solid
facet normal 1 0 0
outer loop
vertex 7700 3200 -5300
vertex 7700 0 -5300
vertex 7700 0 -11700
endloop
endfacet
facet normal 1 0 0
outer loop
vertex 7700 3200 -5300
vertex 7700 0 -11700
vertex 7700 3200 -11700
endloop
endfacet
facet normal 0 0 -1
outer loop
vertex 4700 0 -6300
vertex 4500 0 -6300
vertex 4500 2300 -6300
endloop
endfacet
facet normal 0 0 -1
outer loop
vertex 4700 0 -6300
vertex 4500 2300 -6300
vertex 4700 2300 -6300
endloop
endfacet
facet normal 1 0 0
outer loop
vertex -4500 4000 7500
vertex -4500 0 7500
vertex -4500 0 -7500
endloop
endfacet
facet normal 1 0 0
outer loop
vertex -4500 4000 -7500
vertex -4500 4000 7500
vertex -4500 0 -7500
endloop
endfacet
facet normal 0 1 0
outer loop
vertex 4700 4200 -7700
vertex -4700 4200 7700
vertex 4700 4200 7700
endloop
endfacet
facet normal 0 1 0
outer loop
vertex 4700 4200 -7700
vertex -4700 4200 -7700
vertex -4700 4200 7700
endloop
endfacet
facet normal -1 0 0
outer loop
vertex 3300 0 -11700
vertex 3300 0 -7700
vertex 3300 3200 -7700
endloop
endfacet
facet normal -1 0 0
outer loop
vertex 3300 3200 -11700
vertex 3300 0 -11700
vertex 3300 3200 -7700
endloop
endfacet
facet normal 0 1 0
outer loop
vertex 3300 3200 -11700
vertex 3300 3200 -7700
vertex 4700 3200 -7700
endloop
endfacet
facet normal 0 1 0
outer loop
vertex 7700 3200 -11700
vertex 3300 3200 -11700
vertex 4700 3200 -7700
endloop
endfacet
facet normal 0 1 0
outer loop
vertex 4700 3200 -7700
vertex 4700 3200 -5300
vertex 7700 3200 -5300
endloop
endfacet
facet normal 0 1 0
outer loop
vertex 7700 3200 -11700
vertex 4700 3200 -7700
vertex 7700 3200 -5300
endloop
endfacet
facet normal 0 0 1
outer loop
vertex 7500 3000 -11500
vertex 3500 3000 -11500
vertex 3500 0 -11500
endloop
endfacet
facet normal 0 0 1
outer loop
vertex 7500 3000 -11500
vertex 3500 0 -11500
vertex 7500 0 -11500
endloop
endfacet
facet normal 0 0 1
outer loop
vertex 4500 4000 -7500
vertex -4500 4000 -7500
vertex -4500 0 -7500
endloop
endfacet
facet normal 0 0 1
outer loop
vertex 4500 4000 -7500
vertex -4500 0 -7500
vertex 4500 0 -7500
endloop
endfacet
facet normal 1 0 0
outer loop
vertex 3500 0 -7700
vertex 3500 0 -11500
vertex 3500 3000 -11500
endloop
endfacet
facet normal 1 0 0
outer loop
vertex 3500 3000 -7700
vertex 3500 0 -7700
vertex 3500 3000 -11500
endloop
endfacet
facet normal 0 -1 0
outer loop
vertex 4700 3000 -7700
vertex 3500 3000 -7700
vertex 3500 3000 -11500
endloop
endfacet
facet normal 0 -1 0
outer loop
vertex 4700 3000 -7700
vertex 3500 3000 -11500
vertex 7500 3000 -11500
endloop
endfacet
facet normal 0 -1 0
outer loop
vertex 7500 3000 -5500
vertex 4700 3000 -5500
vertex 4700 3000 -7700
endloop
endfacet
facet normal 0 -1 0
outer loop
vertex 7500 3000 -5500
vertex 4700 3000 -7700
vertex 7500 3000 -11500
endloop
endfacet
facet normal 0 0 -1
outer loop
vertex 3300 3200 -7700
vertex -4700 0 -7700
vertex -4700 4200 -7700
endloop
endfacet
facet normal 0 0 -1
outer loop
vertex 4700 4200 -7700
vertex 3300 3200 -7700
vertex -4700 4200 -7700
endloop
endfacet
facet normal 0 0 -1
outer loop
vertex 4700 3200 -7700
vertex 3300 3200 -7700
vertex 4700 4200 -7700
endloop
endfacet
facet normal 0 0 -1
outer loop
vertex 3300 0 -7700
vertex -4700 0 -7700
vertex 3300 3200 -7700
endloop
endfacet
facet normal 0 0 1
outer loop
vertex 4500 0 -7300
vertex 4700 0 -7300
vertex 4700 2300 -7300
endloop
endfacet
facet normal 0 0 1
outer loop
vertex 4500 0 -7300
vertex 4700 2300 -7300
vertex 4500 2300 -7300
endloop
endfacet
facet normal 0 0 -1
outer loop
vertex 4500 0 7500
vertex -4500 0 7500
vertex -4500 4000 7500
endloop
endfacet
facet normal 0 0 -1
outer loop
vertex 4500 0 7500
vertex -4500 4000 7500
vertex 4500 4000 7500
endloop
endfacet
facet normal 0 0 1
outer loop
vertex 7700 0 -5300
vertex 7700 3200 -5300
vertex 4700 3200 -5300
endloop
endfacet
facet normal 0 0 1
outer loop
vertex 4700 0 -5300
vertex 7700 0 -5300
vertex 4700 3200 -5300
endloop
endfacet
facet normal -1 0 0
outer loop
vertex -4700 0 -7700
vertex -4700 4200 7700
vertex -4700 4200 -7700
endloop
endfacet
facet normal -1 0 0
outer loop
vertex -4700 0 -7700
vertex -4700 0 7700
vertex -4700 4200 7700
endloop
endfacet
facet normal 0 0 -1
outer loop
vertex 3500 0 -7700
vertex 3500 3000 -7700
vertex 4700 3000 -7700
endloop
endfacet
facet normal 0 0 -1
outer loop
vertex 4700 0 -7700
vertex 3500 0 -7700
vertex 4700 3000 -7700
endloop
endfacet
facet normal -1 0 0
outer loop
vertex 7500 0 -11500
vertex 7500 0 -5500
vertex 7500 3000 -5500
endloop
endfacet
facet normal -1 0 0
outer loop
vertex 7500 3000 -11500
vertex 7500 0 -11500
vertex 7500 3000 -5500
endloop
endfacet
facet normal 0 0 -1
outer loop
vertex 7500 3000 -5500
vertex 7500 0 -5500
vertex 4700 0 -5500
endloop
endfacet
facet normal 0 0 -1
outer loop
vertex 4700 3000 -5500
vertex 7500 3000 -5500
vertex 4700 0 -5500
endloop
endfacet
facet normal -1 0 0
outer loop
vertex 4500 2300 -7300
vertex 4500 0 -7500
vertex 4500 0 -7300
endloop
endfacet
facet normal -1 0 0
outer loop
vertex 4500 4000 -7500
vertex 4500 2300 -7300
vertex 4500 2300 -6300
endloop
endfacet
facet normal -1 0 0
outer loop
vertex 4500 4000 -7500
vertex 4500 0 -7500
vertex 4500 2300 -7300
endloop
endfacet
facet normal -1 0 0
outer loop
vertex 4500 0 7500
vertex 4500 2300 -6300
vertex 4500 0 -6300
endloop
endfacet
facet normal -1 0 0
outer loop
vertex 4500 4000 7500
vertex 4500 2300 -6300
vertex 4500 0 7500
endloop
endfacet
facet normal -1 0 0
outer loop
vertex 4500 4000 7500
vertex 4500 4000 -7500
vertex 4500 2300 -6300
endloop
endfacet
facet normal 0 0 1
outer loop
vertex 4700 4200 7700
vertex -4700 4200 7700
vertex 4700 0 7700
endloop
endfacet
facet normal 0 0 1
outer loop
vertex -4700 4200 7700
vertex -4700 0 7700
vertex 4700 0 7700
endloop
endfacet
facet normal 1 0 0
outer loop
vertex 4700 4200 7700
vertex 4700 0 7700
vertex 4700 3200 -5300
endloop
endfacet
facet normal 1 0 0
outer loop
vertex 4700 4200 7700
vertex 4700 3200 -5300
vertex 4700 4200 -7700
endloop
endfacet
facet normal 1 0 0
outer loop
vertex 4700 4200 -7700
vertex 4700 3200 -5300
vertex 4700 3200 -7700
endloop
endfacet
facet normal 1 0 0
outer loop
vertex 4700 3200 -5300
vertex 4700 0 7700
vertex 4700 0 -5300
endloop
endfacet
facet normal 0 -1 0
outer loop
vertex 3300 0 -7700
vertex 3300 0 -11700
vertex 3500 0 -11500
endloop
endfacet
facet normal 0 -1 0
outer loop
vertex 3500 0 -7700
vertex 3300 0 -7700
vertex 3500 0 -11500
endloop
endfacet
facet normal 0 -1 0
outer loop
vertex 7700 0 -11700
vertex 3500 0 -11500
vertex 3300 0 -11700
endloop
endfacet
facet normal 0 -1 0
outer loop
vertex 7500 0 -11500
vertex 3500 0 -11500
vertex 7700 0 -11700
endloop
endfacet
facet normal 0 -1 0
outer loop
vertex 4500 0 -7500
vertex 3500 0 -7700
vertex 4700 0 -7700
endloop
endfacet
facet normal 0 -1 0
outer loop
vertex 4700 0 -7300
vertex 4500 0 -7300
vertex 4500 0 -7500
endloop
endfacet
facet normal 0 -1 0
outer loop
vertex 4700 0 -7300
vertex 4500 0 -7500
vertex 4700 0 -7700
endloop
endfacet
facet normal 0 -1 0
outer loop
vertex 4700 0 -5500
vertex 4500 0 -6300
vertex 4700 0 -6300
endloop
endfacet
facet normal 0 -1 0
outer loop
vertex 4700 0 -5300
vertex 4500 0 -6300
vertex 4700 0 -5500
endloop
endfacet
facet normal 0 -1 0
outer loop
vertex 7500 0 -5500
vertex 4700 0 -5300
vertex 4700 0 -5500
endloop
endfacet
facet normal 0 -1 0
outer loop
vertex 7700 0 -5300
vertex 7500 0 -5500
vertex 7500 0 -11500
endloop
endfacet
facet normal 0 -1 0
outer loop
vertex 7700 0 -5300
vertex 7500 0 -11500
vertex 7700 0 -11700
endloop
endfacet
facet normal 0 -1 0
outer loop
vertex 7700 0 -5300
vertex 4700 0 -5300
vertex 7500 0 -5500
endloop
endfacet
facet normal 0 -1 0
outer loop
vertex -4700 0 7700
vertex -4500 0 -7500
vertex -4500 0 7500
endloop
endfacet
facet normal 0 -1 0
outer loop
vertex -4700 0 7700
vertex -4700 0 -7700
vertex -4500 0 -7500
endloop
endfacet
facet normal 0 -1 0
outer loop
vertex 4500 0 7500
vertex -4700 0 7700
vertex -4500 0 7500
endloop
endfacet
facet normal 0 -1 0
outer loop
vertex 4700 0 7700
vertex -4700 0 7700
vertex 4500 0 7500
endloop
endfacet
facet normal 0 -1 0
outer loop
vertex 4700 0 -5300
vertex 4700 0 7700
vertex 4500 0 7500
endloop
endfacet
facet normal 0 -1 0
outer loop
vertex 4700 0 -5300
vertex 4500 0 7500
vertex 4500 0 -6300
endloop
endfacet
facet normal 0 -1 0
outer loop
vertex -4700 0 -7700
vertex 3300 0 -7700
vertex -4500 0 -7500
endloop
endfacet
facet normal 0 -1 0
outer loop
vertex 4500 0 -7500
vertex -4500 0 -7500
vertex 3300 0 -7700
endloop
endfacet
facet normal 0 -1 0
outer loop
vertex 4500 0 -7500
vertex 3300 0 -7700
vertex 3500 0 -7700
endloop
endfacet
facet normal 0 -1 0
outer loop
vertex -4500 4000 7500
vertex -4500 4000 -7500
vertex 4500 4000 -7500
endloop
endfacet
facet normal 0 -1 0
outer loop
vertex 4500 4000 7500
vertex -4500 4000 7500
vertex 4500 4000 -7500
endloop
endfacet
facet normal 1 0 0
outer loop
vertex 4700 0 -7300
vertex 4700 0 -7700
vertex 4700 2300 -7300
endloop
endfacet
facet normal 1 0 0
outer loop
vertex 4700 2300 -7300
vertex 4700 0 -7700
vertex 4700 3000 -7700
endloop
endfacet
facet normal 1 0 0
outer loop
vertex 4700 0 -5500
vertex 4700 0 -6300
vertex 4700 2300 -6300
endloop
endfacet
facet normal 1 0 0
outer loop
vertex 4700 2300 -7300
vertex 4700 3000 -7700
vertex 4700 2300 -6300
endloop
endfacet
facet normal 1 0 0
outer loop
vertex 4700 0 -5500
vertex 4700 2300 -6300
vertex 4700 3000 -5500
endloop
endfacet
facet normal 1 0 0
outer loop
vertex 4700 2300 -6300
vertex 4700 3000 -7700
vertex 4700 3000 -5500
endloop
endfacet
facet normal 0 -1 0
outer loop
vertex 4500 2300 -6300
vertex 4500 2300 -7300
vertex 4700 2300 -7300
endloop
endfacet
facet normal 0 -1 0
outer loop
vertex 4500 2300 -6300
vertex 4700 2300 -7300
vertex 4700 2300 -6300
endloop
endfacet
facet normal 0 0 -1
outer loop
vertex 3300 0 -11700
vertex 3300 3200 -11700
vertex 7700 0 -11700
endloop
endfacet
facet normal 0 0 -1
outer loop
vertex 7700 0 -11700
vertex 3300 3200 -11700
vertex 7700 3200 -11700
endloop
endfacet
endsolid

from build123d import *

# Parameters (mm, degrees)
SKETCH1_W                        = 9000
SKETCH1_H                        = 15000
BOSS_EXTRUDE1_DEPTH              = 4000
BOSS_EXTRUDE2_DEPTH              = 4000
BOSS_EXTRUDE2_DEPTH_BACK         = 2000
SKETCH2_W                        = 3000
SKETCH2_H                        = 3000
SKETCH2_W_2                      = 1000
SKETCH3_W                        = 11000
SKETCH3_H                        = 7000
BOSS_EXTRUDE3_DEPTH              = 12500
SKETCH4_W                        = 7000
SKETCH4_H                        = 4000
BOSS_EXTRUDE4_DEPTH              = 1500
SKETCH5_W                        = 10000
SKETCH5_H                        = 4000
BOSS_EXTRUDE5_DEPTH              = 12000
SKETCH6_R                        = 2000
BOSS_EXTRUDE6_DEPTH              = 6000
BOSS_EXTRUDE8_DEPTH              = 10000
BOSS_EXTRUDE8_DEPTH_BACK         = 4000
SKETCH9_R                        = 7500
REVOLVE5_ANGLE                   = 180
BOSS_EXTRUDE9_START              = 40000
BOSS_EXTRUDE9_DEPTH              = 40000
BOSS_EXTRUDE11_REACH             = 44869.165
SKETCH16_R                       = 7500
BOSS_EXTRUDE11_DIRECTION_2_DEPTH = 20000
BOSS_EXTRUDE12_DEPTH             = 10000
FILLET1_R                        = 1000
FILLET2_R                        = 1000
SKETCH19_W                       = 3000
SKETCH19_H                       = 6000
CUT_EXTRUDE1_DEPTH               = 8500
CUT_EXTRUDE2_DEPTH               = 65678.168408597
CUT_EXTRUDE2_DEPTH_BACK          = 65678.168408597
CUT_EXTRUDE5_START               = -6000
CUT_EXTRUDE5_DEPTH               = 24250
SHELL1_T                         = 200
SKETCH23_W                       = 1000
SKETCH23_H                       = 200
SKETCH23_W_2                     = 200
SKETCH23_H_2                     = 800
BOSS_EXTRUDE13_DEPTH             = 3000
SKETCH24_W                       = 1000
SKETCH24_H                       = 700
BOSS_EXTRUDE14_DEPTH             = 200


# Read off the part's stored shape, not the designer's step: Cut-Extrude5
with BuildPart() as part:
    # Sketch1 → Boss-Extrude1 (new body)
    with BuildSketch(Plane(origin=(0, 0, 0), x_dir=(1, 0, 0), z_dir=(0, 1, 0))):
        Rectangle(SKETCH1_W, SKETCH1_H)
    extrude(amount=BOSS_EXTRUDE1_DEPTH)

    # Sketch2 → Boss-Extrude2 (add, two sides: drawn at the far end of the back side and taken through both)
    with BuildSketch(Plane(origin=(0, 0, -7500), x_dir=(-1, 0, 0), z_dir=(0, 0, -1)).offset(-BOSS_EXTRUDE2_DEPTH_BACK)):
        with Locations((-6000, 1500)):
            Rectangle(SKETCH2_W, SKETCH2_H)
        with Locations((-4000, 1500)):
            Rectangle(SKETCH2_W_2, SKETCH2_H)
    extrude(amount=BOSS_EXTRUDE2_DEPTH + BOSS_EXTRUDE2_DEPTH_BACK)

    # Sketch3 → Boss-Extrude3 (add)
    with BuildSketch(Plane.XZ):
        with Locations((5000, -8000)):
            Rectangle(SKETCH3_W, SKETCH3_H)
    extrude(amount=BOSS_EXTRUDE3_DEPTH)

    # Sketch4 → Boss-Extrude4 (add)
    with BuildSketch(Plane.XZ.offset(12500)):
        with Locations((7000, -9500)):
            Rectangle(SKETCH4_W, SKETCH4_H)
    extrude(amount=BOSS_EXTRUDE4_DEPTH)

    # Sketch5 → Boss-Extrude5 (add)
    with BuildSketch(Plane.XY.offset(-4500)):
        with Locations((4500, -10500)):
            Rectangle(SKETCH5_W, SKETCH5_H)
    extrude(amount=BOSS_EXTRUDE5_DEPTH)

    # Sketch6 → Boss-Extrude6 (add)
    with BuildSketch(Plane(origin=(9500, 0, 0), x_dir=(0, 0, -1), z_dir=(1, 0, 0))):
        with Locations(Location((-5250, -11500, 0), (0, 0, 210))):
            Circle(SKETCH6_R)
    extrude(amount=BOSS_EXTRUDE6_DEPTH)

    # Sketch9 → Boss-Extrude8 (add, two sides: drawn at the far end of the back side and taken through both)
    with BuildSketch(Plane(origin=(0, -10500, 0), x_dir=(-1, 0, 0), z_dir=(0, -1, 0)).offset(-BOSS_EXTRUDE8_DEPTH_BACK)):
        with Locations(Location((-22728.4161474, -5250, 0), (0, 0, 90))):
            Circle(SKETCH9_R)
    extrude(amount=BOSS_EXTRUDE8_DEPTH + BOSS_EXTRUDE8_DEPTH_BACK)

    # Sketch10 → Revolve5 (revolve)
    with BuildSketch(Plane(origin=(0, -6500, 0), x_dir=(1, 0, 0), z_dir=(0, 1, 0))):
        with BuildLine():
            Line((15228.4161474, -5250), (30228.4161474, -5250))
            ThreePointArc((30228.4161474, -5250), (22728.4161474, 2250), (15228.4161474, -5250))
        make_face()
    revolve(axis=Axis((15228.4161474, -6500, 5250), (1, 0, 0)), revolution_arc=REVOLVE5_ANGLE)

    # Sketch12 → Boss-Extrude9 (add)
    with BuildSketch(Plane.ZY.offset(500).offset(BOSS_EXTRUDE9_START)):
        with BuildLine():
            ThreePointArc((3517.949192431, -12500), (5250, -13500), (6982.050807569, -12500))
            ThreePointArc((6982.050807569, -12500), (5250, -9500), (3517.949192431, -12500))
        make_face()
    extrude(amount=-BOSS_EXTRUDE9_DEPTH)

    # Boss-Extrude11: up to this face of the body (flat: up to its plane)
    boss_extrude11_end = Plane(part.part.faces().sort_by_distance((-250, 0, 750))[0])
    # Sketch16 → Boss-Extrude11 (add, up to the picked face)
    with BuildSketch(Plane(origin=(0, -10500, 0), x_dir=(-1, 0, 0), z_dir=(0, -1, 0)), mode=Mode.PRIVATE) as boss_extrude11_sk1:
        with Locations(Location((47728.4161474, -5250, 0), (0, 0, 90))):
            Circle(SKETCH16_R)
    boss_extrude11_tool1 = split(extrude(boss_extrude11_sk1.sketch, amount=-BOSS_EXTRUDE11_REACH, mode=Mode.PRIVATE), bisect_by=boss_extrude11_end, keep=Keep.BOTH, mode=Mode.PRIVATE)
    add(boss_extrude11_tool1.solids().sort_by(Axis((-47728.416147, -10500, 5250), (0, 1, 0)))[0])

    # Sketch16 → Boss-Extrude11 direction 2 (add)
    with BuildSketch(Plane(origin=(0, -10500, 0), x_dir=(-1, 0, 0), z_dir=(0, -1, 0))):
        with Locations(Location((47728.4161474, -5250, 0), (0, 0, 90))):
            Circle(SKETCH16_R)
    extrude(amount=BOSS_EXTRUDE11_DIRECTION_2_DEPTH)

    # Sketch18 → Boss-Extrude12 (add)
    with BuildSketch(Plane(origin=(-500, 0, 0), x_dir=(0, 0, -1), z_dir=(1, 0, 0))):
        with BuildLine():
            Line((-3517.949192431, -12500), (-6982.050807569, -12500))
            ThreePointArc((-6982.050807569, -12500), (-5250, -13500), (-3517.949192431, -12500))
        make_face()
    extrude(amount=BOSS_EXTRUDE12_DEPTH)

    # Fillet1
    fillet1_edges = [part.edges().sort_by_distance(p)[0] for p in [
        (22728.4161474, -20500, 12750),
    ]]
    fillet(fillet1_edges, radius=FILLET1_R)

    # Fillet2
    fillet2_edges = [part.edges().sort_by_distance(p)[0] for p in [
        (-47728.4161474, -30500, 12750),
    ]]
    fillet(fillet2_edges, radius=FILLET2_R)

    # Sketch19 → Cut-Extrude1 (cut)
    with BuildSketch(Plane(origin=(0, 0, 0), x_dir=(1, 0, 0), z_dir=(0, 1, 0))):
        with Locations((9000, 8500)):
            Rectangle(SKETCH19_W, SKETCH19_H)
    extrude(amount=-CUT_EXTRUDE1_DEPTH, mode=Mode.SUBTRACT)

    # Sketch20 → Cut-Extrude2 (cut, two sides: drawn at the far end of the back side and taken through both)
    with BuildSketch(Plane(origin=(0, 0, -5500), x_dir=(-1, 0, 0), z_dir=(0, 0, -1)).offset(-CUT_EXTRUDE2_DEPTH_BACK)):
        Polygon((-10500, 0), (-10500, -8500), (-7500, -7500), (-7500, 0), align=None)
    extrude(amount=CUT_EXTRUDE2_DEPTH + CUT_EXTRUDE2_DEPTH_BACK, mode=Mode.SUBTRACT)

    # Cut-Extrude5 outline → Cut-Extrude5 (cut)
    with BuildSketch(Plane.XY.offset(-5500).offset(CUT_EXTRUDE5_START)):
        Polygon((-500, 0), (-500, -4833.333333333), (-15000, 0), (-55230, 0), (-55230, -30500), (30230, -30500), (30230, 1001), (7500, 1001), (7500, 0), align=None)
    extrude(amount=CUT_EXTRUDE5_DEPTH, mode=Mode.SUBTRACT)

    # Shell1
    shell1_openings = [part.faces().sort_by_distance(p)[0] for p in [
        (789.808917197, 0, -1216.560509554),
    ]]
    offset(amount=SHELL1_T, openings=shell1_openings, kind=Kind.INTERSECTION)

    # Sketch23 → Boss-Extrude13 (add)
    with BuildSketch(Plane.XZ.offset(-3000)):
        Polygon((4500, -7300), (4500, -7500), (4500, -7700), (4700, -7700), (4700, -7300), align=None)
        with Locations((4000, -7600)):
            Rectangle(SKETCH23_W, SKETCH23_H)
        with Locations((4600, -5900)):
            Rectangle(SKETCH23_W_2, SKETCH23_H_2)
    extrude(amount=BOSS_EXTRUDE13_DEPTH)

    # Sketch24 → Boss-Extrude14 (add)
    with BuildSketch(Plane.ZY.offset(-4500)):
        with Locations((-6800, 2650)):
            Rectangle(SKETCH24_W, SKETCH24_H)
    extrude(amount=-BOSS_EXTRUDE14_DEPTH)


solid = part.part
